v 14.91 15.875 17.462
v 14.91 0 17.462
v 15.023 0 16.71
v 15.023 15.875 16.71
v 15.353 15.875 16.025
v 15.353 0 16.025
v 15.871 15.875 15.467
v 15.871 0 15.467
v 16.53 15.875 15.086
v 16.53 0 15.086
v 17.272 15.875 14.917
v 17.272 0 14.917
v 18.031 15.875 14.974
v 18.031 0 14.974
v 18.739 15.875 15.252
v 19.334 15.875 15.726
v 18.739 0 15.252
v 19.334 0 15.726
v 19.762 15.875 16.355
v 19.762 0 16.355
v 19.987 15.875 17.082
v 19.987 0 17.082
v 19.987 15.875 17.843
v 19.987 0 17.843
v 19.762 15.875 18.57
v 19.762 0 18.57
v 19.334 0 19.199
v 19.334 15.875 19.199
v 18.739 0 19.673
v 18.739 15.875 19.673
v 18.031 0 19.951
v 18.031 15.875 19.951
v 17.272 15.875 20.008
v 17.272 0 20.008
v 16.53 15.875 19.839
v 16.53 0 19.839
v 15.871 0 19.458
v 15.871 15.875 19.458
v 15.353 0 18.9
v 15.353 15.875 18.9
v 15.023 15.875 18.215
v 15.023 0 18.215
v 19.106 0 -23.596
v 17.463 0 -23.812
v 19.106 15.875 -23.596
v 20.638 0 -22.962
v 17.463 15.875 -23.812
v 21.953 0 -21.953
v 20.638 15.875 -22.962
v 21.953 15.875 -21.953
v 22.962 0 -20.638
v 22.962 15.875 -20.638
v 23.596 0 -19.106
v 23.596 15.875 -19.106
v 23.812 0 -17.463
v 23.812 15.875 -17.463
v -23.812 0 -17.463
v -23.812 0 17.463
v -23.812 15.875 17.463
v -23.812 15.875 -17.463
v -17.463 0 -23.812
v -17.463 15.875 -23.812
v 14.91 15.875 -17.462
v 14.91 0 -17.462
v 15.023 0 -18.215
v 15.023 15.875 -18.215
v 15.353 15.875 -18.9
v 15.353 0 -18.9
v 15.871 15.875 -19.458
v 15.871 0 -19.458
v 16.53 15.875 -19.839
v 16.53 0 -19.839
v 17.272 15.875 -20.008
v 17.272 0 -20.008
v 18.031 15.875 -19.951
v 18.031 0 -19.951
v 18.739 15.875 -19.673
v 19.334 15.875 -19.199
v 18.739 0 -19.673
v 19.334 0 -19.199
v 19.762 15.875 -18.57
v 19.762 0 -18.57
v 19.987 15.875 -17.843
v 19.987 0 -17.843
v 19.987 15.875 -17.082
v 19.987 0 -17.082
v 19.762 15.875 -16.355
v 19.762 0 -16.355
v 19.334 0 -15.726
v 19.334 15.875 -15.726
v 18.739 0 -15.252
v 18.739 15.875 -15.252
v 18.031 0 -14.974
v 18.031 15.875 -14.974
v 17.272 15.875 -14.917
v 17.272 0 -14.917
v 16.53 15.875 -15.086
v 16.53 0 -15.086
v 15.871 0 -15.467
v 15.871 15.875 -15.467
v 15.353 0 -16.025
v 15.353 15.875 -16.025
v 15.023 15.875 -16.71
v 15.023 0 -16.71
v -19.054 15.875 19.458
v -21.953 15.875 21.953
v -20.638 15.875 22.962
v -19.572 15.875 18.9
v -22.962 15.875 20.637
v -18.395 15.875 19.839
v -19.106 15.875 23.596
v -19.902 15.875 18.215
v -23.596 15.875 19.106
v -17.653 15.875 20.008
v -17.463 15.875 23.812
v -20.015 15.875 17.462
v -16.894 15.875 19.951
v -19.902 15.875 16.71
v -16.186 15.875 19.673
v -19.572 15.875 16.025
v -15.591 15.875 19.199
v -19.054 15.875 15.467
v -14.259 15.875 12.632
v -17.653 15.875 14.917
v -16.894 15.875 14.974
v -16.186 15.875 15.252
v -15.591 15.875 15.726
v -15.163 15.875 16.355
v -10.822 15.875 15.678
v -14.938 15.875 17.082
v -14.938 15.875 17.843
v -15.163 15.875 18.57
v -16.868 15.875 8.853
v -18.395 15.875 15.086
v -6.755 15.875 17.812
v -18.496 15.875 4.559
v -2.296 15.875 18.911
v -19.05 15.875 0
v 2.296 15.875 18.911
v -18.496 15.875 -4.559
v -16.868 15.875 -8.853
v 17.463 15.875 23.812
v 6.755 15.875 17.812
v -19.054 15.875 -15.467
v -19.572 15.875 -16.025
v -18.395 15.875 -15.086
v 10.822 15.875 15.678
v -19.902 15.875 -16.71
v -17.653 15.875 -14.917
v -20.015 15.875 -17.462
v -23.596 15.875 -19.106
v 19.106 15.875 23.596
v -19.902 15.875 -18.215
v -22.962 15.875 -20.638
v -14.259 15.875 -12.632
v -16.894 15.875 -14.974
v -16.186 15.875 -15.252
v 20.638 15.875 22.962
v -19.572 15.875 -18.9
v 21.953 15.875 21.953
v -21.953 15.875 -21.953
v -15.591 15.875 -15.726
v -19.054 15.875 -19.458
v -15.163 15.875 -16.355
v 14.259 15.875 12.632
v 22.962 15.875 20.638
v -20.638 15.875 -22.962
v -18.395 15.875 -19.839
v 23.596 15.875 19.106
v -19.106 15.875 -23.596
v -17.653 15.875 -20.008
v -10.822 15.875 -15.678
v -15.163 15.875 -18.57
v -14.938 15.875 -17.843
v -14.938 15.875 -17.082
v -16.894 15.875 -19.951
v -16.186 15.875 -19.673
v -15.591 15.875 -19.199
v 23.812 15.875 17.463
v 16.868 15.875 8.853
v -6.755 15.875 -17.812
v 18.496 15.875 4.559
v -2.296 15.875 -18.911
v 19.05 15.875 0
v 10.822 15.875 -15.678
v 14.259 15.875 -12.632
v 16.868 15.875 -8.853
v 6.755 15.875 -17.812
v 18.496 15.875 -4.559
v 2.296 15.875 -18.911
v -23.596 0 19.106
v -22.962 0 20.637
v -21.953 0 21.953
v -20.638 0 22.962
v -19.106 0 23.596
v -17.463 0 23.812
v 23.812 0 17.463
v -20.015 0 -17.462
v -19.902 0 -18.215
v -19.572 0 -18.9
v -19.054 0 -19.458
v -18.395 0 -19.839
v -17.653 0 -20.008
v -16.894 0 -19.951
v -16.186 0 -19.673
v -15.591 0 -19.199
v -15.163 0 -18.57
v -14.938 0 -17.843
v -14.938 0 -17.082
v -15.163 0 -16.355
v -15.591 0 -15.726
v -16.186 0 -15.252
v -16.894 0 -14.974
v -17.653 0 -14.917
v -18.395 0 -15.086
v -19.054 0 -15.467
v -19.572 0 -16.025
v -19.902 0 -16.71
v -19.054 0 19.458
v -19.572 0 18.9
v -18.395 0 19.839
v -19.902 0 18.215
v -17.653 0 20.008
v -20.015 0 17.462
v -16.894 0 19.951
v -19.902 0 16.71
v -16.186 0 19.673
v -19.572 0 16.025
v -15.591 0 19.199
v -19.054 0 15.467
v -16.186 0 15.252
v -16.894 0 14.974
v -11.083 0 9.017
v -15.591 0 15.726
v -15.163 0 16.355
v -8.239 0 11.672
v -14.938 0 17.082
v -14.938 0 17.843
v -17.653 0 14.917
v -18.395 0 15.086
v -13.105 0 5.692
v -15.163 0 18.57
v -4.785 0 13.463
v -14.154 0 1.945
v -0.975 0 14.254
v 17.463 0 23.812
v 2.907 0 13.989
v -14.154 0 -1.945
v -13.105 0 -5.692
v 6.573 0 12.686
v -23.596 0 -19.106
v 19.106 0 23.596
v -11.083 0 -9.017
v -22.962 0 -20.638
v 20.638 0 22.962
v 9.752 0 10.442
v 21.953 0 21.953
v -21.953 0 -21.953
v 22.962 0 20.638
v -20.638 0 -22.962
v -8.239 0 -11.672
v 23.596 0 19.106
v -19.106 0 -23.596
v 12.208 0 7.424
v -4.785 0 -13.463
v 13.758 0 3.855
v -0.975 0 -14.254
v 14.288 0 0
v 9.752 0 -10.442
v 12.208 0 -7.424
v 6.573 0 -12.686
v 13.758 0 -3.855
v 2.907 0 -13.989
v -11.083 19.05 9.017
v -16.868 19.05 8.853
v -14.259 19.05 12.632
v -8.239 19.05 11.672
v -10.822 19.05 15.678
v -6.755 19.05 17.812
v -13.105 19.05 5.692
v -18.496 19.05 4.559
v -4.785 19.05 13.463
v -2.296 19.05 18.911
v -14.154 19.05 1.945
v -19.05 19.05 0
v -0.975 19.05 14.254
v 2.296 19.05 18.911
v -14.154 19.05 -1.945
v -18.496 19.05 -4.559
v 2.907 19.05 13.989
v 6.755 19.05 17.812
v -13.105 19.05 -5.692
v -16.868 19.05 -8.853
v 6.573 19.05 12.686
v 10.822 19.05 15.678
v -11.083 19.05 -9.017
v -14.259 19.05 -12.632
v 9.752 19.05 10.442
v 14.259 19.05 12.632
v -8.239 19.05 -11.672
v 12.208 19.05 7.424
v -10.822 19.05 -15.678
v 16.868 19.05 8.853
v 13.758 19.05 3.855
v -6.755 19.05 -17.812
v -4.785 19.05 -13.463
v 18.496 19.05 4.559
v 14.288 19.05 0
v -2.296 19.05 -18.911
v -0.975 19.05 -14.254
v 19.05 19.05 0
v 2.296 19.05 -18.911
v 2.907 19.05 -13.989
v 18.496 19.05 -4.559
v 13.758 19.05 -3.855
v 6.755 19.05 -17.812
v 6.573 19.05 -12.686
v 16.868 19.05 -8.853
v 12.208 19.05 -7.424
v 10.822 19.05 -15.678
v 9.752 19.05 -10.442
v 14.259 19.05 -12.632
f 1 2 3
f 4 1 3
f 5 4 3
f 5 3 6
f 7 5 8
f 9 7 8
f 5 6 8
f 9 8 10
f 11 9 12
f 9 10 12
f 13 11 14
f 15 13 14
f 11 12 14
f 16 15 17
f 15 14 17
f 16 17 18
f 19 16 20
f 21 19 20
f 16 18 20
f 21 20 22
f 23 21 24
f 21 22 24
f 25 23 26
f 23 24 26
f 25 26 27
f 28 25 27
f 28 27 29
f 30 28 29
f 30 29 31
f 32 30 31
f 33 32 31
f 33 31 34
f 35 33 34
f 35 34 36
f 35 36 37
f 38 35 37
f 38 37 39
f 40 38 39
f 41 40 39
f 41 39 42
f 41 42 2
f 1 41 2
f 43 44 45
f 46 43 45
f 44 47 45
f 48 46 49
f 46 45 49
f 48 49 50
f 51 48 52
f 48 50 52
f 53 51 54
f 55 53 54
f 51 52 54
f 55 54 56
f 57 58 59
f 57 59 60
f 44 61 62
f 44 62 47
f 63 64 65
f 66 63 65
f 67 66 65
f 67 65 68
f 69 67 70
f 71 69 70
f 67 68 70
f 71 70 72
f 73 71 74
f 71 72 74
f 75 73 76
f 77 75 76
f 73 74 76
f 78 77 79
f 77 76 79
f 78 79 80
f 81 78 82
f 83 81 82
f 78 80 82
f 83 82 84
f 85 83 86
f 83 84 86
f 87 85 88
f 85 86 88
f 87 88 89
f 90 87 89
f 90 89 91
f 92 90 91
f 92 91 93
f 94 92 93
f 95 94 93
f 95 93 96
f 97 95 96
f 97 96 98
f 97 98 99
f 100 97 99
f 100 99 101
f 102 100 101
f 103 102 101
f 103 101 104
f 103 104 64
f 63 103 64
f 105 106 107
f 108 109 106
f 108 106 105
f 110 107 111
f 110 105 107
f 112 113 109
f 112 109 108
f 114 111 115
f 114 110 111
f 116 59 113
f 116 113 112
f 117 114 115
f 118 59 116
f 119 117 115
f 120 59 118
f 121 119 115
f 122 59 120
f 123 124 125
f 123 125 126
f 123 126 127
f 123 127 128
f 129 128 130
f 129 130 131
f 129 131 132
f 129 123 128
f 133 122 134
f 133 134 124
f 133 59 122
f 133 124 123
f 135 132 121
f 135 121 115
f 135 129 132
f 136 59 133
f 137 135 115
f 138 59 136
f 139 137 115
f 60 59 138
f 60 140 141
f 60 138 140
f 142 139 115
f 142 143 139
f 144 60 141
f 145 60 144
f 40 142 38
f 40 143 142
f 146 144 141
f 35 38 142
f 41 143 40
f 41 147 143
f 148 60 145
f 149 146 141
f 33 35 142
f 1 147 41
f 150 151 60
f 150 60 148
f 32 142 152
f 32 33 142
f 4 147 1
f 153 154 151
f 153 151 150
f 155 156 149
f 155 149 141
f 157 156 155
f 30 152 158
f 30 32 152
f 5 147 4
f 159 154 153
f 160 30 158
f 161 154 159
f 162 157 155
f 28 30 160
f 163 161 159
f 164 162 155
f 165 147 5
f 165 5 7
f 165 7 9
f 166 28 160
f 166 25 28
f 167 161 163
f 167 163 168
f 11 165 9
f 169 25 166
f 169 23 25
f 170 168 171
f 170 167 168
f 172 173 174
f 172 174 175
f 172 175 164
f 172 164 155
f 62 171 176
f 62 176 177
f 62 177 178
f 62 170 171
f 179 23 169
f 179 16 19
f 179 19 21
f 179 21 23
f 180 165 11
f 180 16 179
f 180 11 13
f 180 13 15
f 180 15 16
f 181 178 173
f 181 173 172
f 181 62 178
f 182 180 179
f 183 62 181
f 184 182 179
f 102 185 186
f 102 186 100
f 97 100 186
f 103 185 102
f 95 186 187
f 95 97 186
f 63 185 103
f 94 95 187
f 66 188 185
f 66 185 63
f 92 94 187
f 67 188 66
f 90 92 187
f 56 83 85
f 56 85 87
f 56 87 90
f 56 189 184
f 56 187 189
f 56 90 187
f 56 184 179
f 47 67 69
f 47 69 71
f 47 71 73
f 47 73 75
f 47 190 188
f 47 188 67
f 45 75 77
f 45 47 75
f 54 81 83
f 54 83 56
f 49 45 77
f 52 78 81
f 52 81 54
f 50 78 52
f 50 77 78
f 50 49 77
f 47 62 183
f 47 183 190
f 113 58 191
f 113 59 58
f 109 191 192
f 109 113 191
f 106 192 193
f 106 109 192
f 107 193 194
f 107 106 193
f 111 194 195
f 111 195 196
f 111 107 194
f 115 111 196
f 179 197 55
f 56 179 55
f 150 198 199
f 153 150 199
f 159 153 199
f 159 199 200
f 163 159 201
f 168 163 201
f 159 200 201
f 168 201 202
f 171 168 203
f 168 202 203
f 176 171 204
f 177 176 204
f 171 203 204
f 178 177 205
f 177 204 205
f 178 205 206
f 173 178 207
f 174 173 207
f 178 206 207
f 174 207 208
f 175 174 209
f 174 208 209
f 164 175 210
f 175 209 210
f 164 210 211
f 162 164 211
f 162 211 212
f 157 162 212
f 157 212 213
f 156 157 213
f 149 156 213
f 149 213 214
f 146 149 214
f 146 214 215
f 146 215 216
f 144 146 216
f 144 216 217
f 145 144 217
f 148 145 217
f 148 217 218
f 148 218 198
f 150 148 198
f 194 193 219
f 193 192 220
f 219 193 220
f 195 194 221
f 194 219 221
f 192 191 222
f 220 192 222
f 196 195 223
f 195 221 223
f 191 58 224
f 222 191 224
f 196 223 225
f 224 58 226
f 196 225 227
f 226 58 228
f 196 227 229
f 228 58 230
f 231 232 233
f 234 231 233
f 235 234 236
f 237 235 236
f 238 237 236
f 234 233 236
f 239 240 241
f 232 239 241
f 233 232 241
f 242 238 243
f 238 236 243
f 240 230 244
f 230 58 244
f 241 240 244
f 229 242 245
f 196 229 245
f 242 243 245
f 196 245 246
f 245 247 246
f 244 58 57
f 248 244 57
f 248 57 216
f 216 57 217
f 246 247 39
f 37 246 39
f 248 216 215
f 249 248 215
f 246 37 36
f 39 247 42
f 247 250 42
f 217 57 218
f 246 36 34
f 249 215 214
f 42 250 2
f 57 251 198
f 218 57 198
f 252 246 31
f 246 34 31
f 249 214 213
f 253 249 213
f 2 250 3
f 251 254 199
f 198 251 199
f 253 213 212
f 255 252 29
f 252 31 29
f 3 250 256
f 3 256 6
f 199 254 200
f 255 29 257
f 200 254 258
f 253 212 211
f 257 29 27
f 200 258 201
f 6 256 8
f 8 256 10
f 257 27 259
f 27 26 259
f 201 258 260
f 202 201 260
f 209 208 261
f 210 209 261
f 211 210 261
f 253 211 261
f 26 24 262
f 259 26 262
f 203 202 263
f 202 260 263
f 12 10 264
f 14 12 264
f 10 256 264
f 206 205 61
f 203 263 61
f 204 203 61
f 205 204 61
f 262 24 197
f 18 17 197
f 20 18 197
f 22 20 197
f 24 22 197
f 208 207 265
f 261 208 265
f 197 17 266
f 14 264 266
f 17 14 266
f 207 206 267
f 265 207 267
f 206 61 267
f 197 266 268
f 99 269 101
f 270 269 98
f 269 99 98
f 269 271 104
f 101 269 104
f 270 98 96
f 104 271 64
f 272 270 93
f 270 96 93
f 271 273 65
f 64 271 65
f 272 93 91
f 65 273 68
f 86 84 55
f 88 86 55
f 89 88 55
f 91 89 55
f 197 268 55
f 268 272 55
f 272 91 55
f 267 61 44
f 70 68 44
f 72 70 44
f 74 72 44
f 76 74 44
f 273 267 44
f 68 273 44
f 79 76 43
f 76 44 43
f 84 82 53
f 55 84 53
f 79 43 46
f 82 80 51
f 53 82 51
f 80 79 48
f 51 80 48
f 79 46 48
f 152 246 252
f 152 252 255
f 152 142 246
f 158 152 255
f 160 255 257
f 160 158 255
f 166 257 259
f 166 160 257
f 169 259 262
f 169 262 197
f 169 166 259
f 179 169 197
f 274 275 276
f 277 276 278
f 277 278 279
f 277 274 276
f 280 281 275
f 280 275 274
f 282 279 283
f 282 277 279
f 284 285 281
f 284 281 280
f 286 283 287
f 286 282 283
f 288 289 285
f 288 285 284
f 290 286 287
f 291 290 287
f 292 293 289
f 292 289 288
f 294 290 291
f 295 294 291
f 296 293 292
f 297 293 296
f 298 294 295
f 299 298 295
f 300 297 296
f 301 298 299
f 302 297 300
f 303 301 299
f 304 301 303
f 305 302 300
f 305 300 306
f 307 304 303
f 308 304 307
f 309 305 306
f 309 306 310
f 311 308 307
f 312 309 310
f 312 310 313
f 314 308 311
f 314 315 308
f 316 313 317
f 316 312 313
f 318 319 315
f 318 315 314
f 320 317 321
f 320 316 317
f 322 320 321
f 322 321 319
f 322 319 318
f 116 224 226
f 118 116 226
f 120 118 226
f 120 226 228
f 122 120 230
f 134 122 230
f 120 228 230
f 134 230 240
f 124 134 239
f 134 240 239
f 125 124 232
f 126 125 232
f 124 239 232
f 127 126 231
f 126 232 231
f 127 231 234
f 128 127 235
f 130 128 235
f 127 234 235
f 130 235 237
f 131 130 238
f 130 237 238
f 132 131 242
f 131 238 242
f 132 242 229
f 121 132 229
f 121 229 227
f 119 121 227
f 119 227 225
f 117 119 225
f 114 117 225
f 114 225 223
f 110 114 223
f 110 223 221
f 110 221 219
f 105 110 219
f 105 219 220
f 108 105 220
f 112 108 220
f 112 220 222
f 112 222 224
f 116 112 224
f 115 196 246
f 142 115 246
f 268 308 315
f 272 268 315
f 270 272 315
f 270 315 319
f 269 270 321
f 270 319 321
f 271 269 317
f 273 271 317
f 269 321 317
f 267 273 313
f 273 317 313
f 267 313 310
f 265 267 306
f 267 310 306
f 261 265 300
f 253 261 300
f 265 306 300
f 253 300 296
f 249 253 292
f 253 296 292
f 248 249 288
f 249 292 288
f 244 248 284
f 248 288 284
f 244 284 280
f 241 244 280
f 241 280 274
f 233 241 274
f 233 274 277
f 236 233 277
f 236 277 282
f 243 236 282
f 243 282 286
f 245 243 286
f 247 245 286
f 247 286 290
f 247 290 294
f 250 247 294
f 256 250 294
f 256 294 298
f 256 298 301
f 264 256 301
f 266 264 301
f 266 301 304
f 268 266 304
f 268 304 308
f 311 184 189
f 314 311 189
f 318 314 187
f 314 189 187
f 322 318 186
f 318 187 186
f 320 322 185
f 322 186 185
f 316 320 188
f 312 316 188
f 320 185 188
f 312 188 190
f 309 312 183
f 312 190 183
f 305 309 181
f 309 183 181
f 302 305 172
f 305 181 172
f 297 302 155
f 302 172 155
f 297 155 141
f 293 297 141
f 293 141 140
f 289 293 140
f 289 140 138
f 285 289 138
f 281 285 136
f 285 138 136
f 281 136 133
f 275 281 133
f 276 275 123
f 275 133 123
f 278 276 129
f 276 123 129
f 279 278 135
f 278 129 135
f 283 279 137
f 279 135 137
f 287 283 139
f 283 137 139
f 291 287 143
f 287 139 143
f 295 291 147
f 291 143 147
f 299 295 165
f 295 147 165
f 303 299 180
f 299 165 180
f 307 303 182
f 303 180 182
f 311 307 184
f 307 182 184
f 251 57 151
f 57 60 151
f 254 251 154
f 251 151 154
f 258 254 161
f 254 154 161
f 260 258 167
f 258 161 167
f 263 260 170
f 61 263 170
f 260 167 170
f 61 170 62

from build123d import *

# Parameters (mm, degrees)
SKETCH1_W               = 47.625
SKETCH1_H               = 47.625
BOSS_EXTRUDE1_DEPTH     = 15.875
SKETCH2_R               = 19.05
BOSS_EXTRUDE2_DEPTH     = 3.175
SKETCH3_R               = 14.2875
CUT_EXTRUDE1_DEPTH      = 20.05
F_1_4_20_TAPPED_HOLE1_D = 5.1054
FILLET1_R               = 6.35


with BuildPart() as part:
    # Sketch1 → Boss-Extrude1 (new body)
    with BuildSketch(Plane(origin=(0, 0, 0), x_dir=(1, 0, 0), z_dir=(0, 1, 0))):
        Rectangle(SKETCH1_W, SKETCH1_H)
    extrude(amount=BOSS_EXTRUDE1_DEPTH)

    # Sketch2 → Boss-Extrude2 (add)
    with BuildSketch(Plane(origin=(0, 15.875, 0), x_dir=(1, 0, 0), z_dir=(0, 1, 0))):
        Circle(SKETCH2_R)
    extrude(amount=BOSS_EXTRUDE2_DEPTH)

    # Sketch3 → Cut-Extrude1 (cut, through all)
    with BuildSketch(Plane(origin=(0, 19.05, 0), x_dir=(1, 0, 0), z_dir=(0, 1, 0))):
        Circle(SKETCH3_R)
    extrude(amount=-CUT_EXTRUDE1_DEPTH, mode=Mode.SUBTRACT)

    # 1/4-20 Tapped Hole1 (through all)
    with Locations(Plane(origin=(0, 15.875, 0), x_dir=(1, 0, 0), z_dir=(0, 1, 0))):
        with Locations((-17.4625, 17.4625), (17.4625, 17.4625), (17.4625, -17.4625), (-17.4625, -17.4625)):
            Hole(F_1_4_20_TAPPED_HOLE1_D / 2)

    # Fillet1
    fillet1_edges = [part.edges().sort_by_distance(p)[0] for p in [
        (-23.8125, 7.9375, -23.8125),
        (23.8125, 7.9375, -23.8125),
        (23.8125, 7.9375, 23.8125),
        (-23.8125, 7.9375, 23.8125),
    ]]
    fillet(fillet1_edges, radius=FILLET1_R)


solid = part.part
